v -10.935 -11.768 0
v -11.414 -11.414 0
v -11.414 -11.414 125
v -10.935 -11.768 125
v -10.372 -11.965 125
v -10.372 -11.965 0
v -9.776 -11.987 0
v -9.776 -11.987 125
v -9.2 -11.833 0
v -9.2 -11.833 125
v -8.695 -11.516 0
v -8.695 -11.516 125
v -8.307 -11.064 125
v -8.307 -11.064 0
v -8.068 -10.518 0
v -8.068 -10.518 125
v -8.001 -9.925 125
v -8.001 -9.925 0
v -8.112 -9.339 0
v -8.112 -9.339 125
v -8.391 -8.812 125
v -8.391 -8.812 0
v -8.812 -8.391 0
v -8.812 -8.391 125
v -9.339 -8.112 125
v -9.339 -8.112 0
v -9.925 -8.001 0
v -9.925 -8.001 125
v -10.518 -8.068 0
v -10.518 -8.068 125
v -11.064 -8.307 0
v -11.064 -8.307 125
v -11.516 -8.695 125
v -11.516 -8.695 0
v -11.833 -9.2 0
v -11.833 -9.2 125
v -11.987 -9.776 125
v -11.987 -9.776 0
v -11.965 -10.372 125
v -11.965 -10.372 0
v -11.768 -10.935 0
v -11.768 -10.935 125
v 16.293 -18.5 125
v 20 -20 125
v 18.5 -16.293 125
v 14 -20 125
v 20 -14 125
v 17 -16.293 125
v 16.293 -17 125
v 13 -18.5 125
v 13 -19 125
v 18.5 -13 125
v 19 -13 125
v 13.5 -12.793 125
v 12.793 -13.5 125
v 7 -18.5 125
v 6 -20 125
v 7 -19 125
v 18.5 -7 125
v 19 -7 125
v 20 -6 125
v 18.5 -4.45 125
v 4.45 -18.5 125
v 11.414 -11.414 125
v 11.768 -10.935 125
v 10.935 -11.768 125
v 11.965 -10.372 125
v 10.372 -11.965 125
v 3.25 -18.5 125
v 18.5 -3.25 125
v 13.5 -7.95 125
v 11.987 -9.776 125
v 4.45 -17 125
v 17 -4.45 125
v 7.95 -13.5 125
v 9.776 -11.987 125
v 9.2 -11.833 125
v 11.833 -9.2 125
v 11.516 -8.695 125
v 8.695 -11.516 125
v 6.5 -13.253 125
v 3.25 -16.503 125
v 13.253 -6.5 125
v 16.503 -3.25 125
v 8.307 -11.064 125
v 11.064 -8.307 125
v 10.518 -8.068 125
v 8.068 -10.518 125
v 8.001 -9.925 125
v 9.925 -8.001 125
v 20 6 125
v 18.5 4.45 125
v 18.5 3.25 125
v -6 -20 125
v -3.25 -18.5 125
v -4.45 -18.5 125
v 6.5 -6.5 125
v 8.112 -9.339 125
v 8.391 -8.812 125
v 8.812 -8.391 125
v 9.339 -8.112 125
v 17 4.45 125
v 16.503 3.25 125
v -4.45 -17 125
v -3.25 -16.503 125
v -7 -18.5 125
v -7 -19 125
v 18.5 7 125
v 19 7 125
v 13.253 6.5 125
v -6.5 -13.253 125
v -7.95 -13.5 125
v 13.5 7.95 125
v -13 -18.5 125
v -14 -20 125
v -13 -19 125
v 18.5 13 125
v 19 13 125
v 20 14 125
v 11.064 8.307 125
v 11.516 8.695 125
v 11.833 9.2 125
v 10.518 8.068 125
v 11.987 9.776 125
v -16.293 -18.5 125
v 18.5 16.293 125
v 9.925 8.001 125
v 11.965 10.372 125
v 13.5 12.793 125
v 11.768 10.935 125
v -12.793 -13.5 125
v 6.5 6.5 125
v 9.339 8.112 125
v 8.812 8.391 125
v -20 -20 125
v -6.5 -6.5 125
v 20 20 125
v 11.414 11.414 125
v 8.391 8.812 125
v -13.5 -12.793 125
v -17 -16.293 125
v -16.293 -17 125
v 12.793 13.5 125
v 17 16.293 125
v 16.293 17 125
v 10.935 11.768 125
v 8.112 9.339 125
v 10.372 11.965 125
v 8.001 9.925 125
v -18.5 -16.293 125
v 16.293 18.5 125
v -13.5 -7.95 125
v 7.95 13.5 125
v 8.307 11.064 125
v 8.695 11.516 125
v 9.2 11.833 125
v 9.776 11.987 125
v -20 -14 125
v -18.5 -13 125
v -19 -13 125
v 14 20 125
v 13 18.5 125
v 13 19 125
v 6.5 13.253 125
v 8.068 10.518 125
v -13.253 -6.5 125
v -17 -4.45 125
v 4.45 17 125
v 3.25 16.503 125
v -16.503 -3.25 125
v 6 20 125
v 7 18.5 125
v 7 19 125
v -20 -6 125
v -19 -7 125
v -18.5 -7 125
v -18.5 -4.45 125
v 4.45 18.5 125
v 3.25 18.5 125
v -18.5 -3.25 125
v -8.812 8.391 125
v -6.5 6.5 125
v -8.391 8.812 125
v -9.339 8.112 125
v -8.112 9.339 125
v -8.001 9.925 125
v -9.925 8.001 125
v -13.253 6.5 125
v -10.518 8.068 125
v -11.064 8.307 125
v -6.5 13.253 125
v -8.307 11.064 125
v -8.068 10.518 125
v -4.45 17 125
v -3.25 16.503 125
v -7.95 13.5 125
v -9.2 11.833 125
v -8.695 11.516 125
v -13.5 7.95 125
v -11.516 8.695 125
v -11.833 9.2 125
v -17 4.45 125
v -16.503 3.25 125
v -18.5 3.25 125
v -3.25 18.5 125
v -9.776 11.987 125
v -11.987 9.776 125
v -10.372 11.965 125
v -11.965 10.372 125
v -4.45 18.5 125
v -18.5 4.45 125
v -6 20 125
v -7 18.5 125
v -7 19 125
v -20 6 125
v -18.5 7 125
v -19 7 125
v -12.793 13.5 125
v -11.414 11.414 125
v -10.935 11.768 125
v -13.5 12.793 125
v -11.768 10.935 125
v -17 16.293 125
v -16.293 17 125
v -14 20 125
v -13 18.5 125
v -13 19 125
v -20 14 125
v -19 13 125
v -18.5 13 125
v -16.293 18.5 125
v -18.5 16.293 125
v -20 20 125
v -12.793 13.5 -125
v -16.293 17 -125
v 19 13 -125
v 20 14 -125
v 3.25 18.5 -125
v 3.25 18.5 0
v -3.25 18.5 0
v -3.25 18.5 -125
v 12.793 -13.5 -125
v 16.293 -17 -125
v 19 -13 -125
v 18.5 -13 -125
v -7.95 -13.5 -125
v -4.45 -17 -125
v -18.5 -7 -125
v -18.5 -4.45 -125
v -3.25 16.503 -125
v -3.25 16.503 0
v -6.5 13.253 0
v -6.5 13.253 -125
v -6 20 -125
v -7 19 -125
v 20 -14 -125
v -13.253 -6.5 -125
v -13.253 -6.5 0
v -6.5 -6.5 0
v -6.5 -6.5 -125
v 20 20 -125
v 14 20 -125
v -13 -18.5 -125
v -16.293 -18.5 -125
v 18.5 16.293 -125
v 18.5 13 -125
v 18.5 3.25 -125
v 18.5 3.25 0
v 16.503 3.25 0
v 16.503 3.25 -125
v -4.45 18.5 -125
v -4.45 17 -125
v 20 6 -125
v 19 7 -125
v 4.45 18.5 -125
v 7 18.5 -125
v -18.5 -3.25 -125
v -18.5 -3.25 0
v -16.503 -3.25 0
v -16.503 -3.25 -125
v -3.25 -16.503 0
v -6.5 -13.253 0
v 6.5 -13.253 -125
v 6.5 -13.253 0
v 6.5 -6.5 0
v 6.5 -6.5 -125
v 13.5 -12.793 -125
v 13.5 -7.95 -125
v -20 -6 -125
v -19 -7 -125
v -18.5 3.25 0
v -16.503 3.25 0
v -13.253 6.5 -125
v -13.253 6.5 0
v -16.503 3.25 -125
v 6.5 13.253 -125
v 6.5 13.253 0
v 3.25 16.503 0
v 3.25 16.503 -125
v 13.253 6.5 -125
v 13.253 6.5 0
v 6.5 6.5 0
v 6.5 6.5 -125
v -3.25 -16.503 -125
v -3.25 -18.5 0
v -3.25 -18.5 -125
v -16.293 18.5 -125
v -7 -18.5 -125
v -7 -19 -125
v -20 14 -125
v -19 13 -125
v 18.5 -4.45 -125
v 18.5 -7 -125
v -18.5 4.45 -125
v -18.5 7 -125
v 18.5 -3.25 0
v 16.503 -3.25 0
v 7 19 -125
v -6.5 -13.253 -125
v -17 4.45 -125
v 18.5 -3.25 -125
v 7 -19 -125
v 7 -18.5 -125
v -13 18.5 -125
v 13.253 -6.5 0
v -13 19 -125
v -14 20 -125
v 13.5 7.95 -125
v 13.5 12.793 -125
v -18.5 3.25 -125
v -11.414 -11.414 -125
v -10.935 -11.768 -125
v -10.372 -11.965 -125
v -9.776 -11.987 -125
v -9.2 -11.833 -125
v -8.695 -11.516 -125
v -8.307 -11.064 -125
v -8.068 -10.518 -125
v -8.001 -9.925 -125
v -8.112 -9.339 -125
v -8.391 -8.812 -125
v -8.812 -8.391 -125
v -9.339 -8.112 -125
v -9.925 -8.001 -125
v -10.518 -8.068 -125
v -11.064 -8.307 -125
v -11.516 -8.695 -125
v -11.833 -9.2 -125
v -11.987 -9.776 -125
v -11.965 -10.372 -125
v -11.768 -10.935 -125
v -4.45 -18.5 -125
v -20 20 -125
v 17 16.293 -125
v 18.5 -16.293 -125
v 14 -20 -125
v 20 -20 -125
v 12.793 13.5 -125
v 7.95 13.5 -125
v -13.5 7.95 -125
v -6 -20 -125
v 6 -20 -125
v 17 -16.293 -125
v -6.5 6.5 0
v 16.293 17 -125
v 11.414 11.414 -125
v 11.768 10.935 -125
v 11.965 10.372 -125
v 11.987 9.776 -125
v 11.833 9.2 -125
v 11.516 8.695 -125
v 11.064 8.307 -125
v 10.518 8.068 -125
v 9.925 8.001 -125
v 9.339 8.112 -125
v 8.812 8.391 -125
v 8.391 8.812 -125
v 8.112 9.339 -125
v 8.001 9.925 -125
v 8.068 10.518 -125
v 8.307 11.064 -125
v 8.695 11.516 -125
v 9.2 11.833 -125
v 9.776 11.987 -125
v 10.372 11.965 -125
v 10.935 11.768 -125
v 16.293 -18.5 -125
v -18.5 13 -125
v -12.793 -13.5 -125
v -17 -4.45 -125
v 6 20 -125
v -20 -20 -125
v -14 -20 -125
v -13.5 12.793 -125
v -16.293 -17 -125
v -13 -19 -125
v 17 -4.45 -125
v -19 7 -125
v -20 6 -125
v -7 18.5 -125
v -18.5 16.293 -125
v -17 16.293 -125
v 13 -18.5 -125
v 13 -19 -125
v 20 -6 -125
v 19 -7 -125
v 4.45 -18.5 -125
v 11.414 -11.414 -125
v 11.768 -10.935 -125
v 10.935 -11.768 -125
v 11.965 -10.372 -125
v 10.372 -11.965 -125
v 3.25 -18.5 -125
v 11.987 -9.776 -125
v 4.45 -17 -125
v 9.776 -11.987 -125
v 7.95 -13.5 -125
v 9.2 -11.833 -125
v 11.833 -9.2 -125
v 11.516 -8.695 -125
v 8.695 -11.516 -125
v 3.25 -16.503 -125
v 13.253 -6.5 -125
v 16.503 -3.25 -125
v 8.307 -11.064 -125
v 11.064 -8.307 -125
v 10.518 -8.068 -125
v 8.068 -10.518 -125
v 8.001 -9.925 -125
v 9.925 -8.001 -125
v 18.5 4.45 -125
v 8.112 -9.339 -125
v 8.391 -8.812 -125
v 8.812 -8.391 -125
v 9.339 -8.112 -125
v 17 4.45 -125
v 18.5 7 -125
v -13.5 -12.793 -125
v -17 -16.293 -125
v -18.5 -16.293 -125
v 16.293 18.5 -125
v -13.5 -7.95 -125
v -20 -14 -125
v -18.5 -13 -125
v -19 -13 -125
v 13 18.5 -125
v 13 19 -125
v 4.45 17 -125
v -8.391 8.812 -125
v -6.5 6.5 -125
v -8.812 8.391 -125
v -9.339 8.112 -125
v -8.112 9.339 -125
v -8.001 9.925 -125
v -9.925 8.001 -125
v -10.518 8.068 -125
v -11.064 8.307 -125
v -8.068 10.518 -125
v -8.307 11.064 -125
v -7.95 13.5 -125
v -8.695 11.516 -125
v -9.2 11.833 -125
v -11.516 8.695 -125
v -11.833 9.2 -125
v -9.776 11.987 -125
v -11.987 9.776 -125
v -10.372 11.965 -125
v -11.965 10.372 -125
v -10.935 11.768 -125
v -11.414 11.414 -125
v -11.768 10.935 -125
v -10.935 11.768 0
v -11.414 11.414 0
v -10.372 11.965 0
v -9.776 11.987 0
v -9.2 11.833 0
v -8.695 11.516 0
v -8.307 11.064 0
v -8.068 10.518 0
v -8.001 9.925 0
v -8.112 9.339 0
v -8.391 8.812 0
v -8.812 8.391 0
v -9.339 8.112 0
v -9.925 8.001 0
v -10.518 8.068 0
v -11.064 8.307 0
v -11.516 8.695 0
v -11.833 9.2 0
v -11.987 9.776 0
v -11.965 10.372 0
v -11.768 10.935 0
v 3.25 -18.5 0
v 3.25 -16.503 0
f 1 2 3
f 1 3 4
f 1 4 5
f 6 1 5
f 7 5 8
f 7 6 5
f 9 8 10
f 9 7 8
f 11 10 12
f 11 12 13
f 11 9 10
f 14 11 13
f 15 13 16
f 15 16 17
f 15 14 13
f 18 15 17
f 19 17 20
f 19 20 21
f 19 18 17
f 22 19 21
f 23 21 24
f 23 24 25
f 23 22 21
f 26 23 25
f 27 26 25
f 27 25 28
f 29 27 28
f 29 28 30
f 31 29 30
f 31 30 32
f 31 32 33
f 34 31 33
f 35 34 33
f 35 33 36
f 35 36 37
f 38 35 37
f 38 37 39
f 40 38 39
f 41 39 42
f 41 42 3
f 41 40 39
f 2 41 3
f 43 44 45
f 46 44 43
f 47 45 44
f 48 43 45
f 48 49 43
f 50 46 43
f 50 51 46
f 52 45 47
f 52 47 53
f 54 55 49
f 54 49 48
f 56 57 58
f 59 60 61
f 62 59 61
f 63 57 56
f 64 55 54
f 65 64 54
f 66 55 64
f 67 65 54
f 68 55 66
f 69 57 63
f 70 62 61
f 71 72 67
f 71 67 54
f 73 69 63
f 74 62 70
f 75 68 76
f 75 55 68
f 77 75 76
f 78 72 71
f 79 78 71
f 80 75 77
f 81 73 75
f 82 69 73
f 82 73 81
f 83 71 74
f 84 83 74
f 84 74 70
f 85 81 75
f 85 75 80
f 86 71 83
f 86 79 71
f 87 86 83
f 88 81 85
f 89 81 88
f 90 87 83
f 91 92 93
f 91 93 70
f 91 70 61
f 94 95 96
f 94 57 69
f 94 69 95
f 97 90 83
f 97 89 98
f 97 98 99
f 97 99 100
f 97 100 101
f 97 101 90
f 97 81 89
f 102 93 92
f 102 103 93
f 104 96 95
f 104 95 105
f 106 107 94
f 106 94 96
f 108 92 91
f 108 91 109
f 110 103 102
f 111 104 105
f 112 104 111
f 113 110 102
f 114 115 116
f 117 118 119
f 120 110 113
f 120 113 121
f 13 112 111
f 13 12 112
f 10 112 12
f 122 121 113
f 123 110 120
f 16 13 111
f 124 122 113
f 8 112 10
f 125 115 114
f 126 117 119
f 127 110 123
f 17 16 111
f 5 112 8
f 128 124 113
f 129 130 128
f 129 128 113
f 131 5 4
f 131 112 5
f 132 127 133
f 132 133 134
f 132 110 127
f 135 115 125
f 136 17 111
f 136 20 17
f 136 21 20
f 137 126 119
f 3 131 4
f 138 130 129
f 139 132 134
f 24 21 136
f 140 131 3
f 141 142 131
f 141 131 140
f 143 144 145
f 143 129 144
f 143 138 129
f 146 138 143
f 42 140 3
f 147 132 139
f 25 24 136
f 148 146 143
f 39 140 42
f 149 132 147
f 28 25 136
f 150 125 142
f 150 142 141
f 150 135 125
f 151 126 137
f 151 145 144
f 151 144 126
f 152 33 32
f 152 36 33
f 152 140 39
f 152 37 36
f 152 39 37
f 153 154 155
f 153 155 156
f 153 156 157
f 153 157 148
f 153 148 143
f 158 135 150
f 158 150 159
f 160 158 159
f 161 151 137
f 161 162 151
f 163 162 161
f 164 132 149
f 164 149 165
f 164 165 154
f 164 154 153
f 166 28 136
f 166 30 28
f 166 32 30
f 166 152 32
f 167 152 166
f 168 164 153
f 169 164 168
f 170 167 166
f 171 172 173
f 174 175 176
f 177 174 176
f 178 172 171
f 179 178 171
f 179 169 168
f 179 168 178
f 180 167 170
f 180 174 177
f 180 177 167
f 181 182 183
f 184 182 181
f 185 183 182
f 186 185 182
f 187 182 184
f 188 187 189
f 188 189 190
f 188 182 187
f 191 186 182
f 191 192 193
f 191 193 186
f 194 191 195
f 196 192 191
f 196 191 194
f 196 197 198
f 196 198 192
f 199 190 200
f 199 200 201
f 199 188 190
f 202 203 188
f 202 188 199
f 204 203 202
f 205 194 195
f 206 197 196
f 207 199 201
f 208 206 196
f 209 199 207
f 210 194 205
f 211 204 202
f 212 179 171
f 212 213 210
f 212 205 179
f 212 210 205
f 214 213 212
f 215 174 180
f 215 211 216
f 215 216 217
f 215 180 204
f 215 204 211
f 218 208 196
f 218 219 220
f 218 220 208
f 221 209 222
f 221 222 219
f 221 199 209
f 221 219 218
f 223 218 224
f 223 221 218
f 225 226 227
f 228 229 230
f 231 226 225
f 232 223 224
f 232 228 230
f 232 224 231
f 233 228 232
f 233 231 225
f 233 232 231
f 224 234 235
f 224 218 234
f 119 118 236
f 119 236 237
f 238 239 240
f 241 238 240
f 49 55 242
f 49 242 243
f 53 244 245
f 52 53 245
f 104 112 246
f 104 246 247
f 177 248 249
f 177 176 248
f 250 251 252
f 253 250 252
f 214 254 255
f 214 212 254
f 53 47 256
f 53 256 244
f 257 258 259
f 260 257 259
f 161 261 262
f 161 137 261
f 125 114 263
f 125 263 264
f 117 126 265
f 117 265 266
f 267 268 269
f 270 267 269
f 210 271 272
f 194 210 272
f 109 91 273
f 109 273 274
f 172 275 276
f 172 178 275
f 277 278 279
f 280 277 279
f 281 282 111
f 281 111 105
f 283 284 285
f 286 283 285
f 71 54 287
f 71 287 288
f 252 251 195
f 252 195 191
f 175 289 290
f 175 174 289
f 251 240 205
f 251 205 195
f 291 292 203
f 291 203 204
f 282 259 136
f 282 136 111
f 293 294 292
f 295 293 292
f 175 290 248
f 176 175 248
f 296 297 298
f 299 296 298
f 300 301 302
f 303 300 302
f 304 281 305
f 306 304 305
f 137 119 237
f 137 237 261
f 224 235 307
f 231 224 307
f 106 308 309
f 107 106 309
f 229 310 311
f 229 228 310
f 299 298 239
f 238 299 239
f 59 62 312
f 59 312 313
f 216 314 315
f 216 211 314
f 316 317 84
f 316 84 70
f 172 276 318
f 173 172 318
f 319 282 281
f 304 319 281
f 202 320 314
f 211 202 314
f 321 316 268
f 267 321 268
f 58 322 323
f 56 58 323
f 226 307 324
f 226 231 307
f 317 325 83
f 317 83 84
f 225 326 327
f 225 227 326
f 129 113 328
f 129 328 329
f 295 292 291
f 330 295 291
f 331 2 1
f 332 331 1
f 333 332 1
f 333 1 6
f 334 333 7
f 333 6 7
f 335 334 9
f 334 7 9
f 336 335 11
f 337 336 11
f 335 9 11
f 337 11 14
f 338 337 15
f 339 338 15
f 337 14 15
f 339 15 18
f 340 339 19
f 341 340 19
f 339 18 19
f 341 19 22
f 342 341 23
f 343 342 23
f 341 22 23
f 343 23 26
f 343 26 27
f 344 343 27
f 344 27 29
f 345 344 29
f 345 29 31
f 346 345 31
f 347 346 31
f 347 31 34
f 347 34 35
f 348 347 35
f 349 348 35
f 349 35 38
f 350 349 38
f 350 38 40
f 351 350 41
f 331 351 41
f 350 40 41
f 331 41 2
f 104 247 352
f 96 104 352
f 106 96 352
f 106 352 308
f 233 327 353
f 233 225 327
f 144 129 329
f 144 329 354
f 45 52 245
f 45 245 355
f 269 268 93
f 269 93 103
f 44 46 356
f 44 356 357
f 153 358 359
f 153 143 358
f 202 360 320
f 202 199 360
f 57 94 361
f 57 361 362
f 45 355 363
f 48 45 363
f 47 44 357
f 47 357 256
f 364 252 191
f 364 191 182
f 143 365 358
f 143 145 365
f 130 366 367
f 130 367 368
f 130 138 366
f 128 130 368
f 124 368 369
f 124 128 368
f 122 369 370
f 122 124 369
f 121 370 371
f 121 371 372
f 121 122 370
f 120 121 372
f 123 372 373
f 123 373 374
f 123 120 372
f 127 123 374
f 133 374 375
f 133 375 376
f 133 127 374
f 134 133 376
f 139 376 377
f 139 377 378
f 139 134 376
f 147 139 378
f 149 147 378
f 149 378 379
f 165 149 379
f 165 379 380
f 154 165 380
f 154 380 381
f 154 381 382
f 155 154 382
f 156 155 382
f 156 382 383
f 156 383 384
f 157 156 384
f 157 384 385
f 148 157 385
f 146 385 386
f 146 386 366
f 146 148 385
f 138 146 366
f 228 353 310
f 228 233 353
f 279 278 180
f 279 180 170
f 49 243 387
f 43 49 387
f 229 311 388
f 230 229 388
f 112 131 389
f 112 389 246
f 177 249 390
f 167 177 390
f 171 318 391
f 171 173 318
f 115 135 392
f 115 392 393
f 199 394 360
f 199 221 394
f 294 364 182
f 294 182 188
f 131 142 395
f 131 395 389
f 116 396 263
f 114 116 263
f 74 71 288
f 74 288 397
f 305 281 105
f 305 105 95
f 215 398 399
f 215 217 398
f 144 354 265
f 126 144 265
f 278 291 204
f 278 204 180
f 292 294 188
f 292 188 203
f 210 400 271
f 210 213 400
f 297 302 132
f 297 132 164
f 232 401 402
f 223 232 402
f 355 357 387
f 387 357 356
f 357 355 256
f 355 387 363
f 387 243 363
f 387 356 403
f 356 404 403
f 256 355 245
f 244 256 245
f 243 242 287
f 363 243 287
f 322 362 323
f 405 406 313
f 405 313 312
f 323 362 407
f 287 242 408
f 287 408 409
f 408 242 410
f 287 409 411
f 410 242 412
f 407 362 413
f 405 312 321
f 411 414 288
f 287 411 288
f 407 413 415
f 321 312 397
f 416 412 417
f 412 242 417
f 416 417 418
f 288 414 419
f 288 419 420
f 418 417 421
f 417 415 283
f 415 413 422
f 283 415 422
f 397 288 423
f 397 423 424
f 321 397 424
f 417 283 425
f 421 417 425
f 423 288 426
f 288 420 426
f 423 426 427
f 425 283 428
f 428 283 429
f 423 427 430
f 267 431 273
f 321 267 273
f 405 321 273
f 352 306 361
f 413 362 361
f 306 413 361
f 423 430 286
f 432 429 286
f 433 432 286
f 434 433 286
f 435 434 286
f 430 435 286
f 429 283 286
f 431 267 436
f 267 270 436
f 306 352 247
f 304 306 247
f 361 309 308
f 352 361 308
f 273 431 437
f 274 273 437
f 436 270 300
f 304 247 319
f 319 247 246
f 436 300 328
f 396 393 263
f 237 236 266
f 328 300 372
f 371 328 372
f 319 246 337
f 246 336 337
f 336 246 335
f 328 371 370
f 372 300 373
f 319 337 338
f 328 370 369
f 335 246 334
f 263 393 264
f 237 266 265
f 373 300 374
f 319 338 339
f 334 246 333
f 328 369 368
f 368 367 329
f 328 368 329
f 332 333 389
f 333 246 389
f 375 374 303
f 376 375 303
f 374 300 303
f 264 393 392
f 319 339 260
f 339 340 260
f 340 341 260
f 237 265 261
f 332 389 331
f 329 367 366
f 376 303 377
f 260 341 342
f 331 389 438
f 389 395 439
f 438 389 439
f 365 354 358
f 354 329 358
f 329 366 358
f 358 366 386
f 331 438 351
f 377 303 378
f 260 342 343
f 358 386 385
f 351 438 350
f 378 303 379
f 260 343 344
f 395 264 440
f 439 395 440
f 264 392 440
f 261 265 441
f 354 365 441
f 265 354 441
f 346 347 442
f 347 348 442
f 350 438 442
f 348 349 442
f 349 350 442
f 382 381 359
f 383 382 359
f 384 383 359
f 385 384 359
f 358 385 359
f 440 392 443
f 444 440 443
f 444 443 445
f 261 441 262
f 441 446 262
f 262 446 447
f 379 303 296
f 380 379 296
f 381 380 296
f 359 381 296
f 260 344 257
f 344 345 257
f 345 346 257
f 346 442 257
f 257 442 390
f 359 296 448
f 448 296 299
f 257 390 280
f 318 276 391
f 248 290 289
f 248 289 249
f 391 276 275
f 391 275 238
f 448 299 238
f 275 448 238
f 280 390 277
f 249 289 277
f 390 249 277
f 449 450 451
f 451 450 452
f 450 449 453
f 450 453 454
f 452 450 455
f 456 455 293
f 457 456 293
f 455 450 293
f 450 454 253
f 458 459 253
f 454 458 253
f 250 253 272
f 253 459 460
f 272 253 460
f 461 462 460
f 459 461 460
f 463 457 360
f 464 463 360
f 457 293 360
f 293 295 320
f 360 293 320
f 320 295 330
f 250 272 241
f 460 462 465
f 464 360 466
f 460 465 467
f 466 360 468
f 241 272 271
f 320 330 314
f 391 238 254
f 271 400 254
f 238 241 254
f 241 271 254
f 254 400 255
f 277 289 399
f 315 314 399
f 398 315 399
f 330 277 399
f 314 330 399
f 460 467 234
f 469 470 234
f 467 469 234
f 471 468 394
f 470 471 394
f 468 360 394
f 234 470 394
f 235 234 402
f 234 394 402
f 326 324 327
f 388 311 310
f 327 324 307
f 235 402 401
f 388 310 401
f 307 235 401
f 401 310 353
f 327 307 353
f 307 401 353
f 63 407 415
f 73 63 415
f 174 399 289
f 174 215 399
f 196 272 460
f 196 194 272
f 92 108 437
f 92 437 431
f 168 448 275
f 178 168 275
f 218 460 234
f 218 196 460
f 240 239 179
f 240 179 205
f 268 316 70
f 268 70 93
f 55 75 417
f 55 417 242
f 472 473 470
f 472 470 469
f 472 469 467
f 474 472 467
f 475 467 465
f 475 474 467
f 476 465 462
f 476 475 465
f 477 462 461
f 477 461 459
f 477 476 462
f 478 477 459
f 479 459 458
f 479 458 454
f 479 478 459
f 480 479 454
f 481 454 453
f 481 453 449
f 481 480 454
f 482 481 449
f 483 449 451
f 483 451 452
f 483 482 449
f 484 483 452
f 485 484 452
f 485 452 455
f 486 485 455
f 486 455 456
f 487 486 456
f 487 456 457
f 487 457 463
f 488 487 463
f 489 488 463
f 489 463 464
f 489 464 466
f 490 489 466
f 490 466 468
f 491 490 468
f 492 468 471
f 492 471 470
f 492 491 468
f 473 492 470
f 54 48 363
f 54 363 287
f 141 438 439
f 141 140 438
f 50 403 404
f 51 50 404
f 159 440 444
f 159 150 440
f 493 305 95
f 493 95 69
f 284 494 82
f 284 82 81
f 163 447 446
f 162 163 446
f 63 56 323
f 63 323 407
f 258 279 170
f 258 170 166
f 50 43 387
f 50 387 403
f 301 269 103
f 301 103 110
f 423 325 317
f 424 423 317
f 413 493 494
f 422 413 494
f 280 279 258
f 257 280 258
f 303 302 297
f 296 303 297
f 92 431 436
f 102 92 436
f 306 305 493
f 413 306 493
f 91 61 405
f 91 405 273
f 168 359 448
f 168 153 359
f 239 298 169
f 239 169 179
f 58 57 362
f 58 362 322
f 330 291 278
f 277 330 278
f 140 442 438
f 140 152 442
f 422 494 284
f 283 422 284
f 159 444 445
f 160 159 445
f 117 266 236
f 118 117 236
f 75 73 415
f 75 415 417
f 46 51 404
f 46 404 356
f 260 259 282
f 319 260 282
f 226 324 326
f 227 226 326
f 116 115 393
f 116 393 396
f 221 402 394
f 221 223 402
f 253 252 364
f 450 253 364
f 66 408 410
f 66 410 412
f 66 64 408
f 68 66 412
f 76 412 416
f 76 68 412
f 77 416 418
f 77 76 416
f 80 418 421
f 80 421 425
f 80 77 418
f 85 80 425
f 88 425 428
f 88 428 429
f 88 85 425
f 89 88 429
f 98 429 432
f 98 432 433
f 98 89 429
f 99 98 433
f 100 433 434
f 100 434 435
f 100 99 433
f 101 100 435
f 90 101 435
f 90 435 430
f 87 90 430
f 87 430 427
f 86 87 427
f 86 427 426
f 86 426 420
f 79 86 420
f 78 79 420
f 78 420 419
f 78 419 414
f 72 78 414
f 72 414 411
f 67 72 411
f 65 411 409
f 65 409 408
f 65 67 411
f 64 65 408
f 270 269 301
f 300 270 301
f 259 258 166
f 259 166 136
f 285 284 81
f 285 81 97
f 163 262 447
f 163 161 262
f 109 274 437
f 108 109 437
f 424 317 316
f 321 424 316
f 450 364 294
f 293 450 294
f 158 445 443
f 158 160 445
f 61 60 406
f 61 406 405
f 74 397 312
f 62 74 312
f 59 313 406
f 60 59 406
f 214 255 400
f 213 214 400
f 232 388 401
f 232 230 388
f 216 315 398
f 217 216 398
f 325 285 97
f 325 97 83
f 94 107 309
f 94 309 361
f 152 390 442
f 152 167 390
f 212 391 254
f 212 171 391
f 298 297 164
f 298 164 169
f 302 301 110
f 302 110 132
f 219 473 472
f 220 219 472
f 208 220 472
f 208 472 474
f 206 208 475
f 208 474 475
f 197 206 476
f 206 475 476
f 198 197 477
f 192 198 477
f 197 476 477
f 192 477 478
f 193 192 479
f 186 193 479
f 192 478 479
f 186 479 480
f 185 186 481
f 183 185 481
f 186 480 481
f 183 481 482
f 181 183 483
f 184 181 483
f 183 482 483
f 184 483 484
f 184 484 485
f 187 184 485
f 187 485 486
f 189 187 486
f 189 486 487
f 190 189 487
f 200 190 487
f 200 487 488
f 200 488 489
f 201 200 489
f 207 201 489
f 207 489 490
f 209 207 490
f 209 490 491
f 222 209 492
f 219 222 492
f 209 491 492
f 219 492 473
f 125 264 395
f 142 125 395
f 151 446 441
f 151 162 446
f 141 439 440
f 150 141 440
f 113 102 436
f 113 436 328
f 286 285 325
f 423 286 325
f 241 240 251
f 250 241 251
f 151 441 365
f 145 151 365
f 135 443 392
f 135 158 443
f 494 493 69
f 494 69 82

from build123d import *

# Parameters (mm, degrees)
BOSS_EXTRUDE1_DEPTH      = 125
BOSS_EXTRUDE1_DEPTH_BACK = 125


with BuildPart() as part:
    # Sketch1 → Boss-Extrude1 (new, two sides: drawn at the far end of the back side and taken through both)
    with BuildSketch(Plane(origin=(0, 0, 0), x_dir=(0, 1, 0), z_dir=(0, 0, 1)).offset(-BOSS_EXTRUDE1_DEPTH_BACK)):
        Polygon((-13, 19), (-14, 20), (-20, 20), (-20, 14), (-19, 13), (-18.5, 13), (-18.5, 16.292893219), (-17, 16.292893219), (-13.5, 12.792893219), (-13.5, 7.95), (-17, 4.45), (-18.5, 4.45), (-18.5, 7), (-19, 7), (-20, 6), (-20, -6), (-19, -7), (-18.5, -7), (-18.5, -4.45), (-17, -4.45), (-13.5, -7.95), (-13.5, -12.792893219), (-17, -16.292893219), (-18.5, -16.292893219), (-18.5, -13), (-19, -13), (-20, -14), (-20, -20), (-14, -20), (-13, -19), (-13, -18.5), (-16.292893219, -18.5), (-16.292893219, -17), (-12.792893219, -13.5), (-7.95, -13.5), (-4.45, -17), (-4.45, -18.5), (-7, -18.5), (-7, -19), (-6, -20), (6, -20), (7, -19), (7, -18.5), (4.45, -18.5), (4.45, -17), (7.95, -13.5), (12.792893219, -13.5), (16.292893219, -17), (16.292893219, -18.5), (13, -18.5), (13, -19), (14, -20), (20, -20), (20, -14), (19, -13), (18.5, -13), (18.5, -16.292893219), (17, -16.292893219), (13.5, -12.792893219), (13.5, -7.95), (17, -4.45), (18.5, -4.45), (18.5, -7), (19, -7), (20, -6), (20, 6), (19, 7), (18.5, 7), (18.5, 4.45), (17, 4.45), (13.5, 7.95), (13.5, 12.792893219), (17, 16.292893219), (18.5, 16.292893219), (18.5, 13), (19, 13), (20, 14), (20, 20), (14, 20), (13, 19), (13, 18.5), (16.292893219, 18.5), (16.292893219, 17), (12.792893219, 13.5), (7.95, 13.5), (4.45, 17), (4.45, 18.5), (7, 18.5), (7, 19), (6, 20), (-6, 20), (-7, 19), (-7, 18.5), (-4.45, 18.5), (-4.45, 17), (-7.95, 13.5), (-12.792893219, 13.5), (-16.292893219, 17), (-16.292893219, 18.5), (-13, 18.5), align=None)
        with BuildLine():
            ThreePointArc((-11.414213562, -11.414213562), (-11.414213562, -8.585786438), (-8.585786438, -8.585786438))
            ThreePointArc((-8.585786438, -8.585786438), (-8.585786438, -11.414213562), (-11.414213562, -11.414213562))
        make_face(mode=Mode.SUBTRACT)
        with BuildLine():
            ThreePointArc((11.414213562, -11.414213562), (8.585786438, -11.414213562), (8.585786438, -8.585786438))
            ThreePointArc((8.585786438, -8.585786438), (11.414213562, -8.585786438), (11.414213562, -11.414213562))
        make_face(mode=Mode.SUBTRACT)
        with BuildLine():
            ThreePointArc((-11.414213562, 11.414213562), (-8.585786438, 11.414213562), (-8.585786438, 8.585786438))
            ThreePointArc((-8.585786438, 8.585786438), (-11.414213562, 8.585786438), (-11.414213562, 11.414213562))
        make_face(mode=Mode.SUBTRACT)
        Polygon((3.25, 18.5), (3.25, 16.502943725), (6.5, 13.252943725), (6.5, 6.5), (13.252943725, 6.5), (16.502943725, 3.25), (18.5, 3.25), (18.5, -3.25), (16.502943725, -3.25), (13.252943725, -6.5), (6.5, -6.5), (6.5, -13.252943725), (3.25, -16.502943725), (3.25, -18.5), (-3.25, -18.5), (-3.25, -16.502943725), (-6.5, -13.252943725), (-6.5, -6.5), (-13.252943725, -6.5), (-16.502943725, -3.25), (-18.5, -3.25), (-18.5, 3.25), (-16.502943725, 3.25), (-13.252943725, 6.5), (-6.5, 6.5), (-6.5, 13.252943725), (-3.25, 16.502943725), (-3.25, 18.5), align=None, mode=Mode.SUBTRACT)
        with BuildLine():
            ThreePointArc((11.414213562, 11.414213562), (11.414213562, 8.585786438), (8.585786438, 8.585786438))
            ThreePointArc((8.585786438, 8.585786438), (8.585786438, 11.414213562), (11.414213562, 11.414213562))
        make_face(mode=Mode.SUBTRACT)
    extrude(amount=BOSS_EXTRUDE1_DEPTH + BOSS_EXTRUDE1_DEPTH_BACK)


solid = part.part
